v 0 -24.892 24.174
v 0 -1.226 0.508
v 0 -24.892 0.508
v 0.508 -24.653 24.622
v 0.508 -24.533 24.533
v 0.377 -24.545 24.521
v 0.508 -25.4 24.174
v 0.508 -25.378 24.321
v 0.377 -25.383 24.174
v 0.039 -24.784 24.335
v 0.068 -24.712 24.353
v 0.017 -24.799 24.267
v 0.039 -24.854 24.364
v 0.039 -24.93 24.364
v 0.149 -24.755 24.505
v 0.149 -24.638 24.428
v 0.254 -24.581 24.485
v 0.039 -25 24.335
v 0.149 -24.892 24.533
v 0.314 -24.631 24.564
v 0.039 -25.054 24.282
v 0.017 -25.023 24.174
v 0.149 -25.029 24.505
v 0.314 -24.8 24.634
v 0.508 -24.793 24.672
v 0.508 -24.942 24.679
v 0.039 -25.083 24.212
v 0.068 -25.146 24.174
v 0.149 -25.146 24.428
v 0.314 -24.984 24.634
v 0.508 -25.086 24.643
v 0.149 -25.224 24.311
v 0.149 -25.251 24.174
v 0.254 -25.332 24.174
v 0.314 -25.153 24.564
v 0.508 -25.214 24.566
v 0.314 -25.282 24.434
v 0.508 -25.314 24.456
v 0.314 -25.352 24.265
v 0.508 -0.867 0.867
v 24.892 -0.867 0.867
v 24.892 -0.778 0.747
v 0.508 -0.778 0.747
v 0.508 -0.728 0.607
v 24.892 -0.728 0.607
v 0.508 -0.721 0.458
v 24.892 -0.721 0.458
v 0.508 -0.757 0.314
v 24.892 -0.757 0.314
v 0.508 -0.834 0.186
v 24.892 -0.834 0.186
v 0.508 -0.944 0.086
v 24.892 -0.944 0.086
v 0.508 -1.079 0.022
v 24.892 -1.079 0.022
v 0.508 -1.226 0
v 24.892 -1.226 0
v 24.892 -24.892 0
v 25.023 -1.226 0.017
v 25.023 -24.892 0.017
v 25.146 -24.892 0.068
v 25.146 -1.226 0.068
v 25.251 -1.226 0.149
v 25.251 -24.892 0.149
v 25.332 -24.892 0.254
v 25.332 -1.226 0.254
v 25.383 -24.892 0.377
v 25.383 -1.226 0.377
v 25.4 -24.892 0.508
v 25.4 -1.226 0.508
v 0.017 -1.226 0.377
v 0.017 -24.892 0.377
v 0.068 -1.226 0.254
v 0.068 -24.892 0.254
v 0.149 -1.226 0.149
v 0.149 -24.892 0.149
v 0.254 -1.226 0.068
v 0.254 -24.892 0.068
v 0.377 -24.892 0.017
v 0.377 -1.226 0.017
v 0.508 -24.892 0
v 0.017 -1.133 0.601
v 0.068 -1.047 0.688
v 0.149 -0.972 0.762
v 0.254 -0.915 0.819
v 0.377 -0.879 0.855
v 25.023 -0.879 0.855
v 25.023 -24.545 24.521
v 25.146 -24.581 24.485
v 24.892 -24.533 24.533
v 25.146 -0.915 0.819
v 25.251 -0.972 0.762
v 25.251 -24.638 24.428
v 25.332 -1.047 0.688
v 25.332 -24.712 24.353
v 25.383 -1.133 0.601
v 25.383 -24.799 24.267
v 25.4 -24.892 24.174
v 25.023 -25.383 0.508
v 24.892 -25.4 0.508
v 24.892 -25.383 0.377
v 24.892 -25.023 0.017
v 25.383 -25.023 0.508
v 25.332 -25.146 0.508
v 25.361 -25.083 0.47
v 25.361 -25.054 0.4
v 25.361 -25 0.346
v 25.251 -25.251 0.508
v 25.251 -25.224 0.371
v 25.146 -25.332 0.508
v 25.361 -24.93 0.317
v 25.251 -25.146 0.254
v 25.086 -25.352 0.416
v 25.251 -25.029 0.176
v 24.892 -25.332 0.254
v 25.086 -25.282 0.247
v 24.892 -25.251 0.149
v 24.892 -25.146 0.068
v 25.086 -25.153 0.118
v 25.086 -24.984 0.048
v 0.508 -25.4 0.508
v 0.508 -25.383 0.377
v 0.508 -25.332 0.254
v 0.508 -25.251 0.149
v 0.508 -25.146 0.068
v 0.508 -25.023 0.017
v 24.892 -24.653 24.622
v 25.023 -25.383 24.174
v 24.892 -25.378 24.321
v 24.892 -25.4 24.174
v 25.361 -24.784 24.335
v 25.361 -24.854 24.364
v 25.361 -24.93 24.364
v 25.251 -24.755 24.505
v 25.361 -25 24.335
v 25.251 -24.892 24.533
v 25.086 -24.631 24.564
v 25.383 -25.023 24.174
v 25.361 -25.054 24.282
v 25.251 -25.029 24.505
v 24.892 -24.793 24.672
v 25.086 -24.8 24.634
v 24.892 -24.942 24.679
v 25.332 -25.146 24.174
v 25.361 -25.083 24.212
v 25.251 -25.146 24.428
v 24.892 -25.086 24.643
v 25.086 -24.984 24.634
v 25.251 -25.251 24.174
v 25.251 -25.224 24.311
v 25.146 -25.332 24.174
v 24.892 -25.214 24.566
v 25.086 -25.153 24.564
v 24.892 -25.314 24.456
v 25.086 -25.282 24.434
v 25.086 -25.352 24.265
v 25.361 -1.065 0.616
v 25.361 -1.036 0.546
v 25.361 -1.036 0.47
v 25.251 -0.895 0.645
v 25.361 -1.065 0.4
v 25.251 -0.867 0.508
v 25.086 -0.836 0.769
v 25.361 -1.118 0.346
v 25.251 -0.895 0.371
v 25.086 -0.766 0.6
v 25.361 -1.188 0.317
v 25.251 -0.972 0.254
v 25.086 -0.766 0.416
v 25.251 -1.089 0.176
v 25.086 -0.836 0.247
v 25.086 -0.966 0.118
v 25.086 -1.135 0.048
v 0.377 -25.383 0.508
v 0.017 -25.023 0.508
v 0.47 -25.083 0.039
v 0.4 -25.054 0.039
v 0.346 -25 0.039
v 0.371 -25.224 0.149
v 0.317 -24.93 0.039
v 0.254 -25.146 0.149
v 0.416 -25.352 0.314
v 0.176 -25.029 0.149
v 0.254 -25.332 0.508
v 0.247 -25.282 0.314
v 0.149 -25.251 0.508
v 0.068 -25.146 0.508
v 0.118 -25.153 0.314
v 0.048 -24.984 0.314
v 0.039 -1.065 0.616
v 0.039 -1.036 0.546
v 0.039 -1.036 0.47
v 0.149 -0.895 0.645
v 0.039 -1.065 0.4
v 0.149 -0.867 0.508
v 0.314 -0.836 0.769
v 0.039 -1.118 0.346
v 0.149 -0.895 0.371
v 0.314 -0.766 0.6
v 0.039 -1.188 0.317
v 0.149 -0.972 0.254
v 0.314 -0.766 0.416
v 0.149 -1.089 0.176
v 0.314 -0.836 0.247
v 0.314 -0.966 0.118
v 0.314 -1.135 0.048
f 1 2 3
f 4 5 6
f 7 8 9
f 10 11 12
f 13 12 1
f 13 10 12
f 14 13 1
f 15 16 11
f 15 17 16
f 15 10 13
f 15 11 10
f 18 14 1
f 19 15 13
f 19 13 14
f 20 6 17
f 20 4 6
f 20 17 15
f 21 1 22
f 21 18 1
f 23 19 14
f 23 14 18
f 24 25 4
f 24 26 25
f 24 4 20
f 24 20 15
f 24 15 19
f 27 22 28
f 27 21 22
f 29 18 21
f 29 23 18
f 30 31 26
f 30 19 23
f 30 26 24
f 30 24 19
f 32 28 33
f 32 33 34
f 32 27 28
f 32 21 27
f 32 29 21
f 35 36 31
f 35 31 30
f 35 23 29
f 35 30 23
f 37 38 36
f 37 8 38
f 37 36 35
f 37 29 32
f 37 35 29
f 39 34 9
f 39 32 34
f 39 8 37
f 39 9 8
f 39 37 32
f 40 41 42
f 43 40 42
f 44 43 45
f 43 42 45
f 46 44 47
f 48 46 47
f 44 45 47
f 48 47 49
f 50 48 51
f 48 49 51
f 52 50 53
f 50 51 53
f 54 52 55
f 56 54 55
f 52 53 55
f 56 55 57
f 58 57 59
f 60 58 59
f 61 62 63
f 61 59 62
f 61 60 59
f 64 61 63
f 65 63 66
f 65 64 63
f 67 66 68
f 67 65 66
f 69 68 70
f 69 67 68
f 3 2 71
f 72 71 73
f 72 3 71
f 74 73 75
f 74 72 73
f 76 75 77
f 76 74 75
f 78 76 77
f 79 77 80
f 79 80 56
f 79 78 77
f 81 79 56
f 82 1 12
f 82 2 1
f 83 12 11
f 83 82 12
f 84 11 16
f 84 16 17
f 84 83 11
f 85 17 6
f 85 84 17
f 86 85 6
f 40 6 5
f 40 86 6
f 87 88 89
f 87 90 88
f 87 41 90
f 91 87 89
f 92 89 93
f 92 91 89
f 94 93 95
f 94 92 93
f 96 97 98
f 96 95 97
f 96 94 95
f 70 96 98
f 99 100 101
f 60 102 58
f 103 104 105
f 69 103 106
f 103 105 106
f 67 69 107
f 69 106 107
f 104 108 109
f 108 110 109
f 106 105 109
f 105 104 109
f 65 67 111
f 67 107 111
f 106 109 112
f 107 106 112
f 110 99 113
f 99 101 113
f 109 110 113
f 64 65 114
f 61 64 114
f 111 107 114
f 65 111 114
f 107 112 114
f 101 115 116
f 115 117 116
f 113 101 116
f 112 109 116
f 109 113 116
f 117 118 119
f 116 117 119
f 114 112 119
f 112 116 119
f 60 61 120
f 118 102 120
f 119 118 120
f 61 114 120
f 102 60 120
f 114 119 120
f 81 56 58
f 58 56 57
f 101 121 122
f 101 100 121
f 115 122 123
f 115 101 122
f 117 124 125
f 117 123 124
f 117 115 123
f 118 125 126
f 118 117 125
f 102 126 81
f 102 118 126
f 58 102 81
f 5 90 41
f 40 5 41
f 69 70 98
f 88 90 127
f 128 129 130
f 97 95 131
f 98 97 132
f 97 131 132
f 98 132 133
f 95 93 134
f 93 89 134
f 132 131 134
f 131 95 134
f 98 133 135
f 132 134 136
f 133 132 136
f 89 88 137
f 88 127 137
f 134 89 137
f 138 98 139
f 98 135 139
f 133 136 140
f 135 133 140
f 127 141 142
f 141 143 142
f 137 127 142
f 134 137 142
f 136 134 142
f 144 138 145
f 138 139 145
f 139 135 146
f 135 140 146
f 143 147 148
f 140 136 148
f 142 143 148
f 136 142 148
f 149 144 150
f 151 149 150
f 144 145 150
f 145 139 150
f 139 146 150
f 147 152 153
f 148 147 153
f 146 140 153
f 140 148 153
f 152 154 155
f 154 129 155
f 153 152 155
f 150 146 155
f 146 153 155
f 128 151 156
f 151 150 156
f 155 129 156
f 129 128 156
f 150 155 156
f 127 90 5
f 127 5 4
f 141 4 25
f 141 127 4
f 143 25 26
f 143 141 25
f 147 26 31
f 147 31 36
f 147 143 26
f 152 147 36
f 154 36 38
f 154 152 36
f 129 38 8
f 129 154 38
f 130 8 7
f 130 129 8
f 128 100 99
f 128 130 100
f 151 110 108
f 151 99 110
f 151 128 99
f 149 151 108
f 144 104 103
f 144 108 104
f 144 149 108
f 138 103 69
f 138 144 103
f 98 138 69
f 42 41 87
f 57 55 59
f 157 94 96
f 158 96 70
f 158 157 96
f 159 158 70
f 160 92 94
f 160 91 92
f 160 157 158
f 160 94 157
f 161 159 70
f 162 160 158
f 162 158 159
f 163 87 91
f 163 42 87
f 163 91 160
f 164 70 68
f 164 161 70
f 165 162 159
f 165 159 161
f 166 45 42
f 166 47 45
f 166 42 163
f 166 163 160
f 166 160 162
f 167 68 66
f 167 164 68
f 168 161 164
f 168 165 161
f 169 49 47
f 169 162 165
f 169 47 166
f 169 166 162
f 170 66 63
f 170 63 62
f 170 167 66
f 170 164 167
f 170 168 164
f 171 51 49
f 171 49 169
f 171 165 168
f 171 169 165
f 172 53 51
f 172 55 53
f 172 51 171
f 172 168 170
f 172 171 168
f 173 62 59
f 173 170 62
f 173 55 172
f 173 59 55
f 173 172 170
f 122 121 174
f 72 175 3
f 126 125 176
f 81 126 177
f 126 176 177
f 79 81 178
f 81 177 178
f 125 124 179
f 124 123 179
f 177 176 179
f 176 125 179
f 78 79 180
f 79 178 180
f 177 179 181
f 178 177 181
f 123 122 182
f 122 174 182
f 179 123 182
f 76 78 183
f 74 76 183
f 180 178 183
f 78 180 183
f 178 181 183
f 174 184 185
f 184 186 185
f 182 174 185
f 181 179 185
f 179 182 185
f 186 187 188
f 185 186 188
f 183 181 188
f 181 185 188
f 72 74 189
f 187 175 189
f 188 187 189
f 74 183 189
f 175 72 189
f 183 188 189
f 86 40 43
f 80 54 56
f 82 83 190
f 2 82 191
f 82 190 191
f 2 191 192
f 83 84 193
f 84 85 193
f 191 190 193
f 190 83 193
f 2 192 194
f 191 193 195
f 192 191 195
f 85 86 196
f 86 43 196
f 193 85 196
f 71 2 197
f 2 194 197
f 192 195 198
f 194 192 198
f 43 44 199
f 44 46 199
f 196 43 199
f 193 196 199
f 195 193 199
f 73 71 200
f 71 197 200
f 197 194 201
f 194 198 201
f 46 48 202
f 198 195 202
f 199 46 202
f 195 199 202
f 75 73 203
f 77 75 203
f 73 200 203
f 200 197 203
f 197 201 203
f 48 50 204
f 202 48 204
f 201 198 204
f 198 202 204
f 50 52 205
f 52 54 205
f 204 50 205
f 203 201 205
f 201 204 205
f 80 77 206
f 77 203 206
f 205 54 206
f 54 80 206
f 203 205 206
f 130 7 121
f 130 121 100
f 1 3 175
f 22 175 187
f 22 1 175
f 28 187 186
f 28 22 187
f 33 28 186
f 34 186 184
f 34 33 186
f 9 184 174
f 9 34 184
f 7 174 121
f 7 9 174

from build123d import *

# Parameters (mm, degrees)
F0_W     = 25.4
F0_H     = 25.4
F1_DEPTH = 25.4
F3_DEPTH = 25.4
F4_R     = 0.508


with BuildPart() as f1:
    # F0 (on Front) → F1 (new body)
    with BuildSketch(Plane.XZ):
        with Locations((12.7, 12.7)):
            Rectangle(F0_W, F0_H)
    extrude(amount=F1_DEPTH)

    # F2 (on face) → F3 (cut)
    with BuildSketch(Plane.YZ.offset(25.4)):
        Polygon((0, 25.4), (-25.4, 25.4), (0, 0), align=None)
    extrude(amount=-F3_DEPTH, mode=Mode.SUBTRACT)

    # F4
    f4_edges = [f1.edges().sort_by_distance(p)[0] for p in [
        (0, -25.4, 12.7),
        (12.7, -25.4, 0),
        (25.4, -25.4, 12.7),
        (12.7, -25.4, 25.4),
        (25.4, -12.7, 12.7),
        (25.4, -12.7, 0),
        (12.7, 0, 0),
        (0, -12.7, 12.7),
        (0, -12.7, 0),
    ]]
    fillet(f4_edges, radius=F4_R)


solid = f1.part
